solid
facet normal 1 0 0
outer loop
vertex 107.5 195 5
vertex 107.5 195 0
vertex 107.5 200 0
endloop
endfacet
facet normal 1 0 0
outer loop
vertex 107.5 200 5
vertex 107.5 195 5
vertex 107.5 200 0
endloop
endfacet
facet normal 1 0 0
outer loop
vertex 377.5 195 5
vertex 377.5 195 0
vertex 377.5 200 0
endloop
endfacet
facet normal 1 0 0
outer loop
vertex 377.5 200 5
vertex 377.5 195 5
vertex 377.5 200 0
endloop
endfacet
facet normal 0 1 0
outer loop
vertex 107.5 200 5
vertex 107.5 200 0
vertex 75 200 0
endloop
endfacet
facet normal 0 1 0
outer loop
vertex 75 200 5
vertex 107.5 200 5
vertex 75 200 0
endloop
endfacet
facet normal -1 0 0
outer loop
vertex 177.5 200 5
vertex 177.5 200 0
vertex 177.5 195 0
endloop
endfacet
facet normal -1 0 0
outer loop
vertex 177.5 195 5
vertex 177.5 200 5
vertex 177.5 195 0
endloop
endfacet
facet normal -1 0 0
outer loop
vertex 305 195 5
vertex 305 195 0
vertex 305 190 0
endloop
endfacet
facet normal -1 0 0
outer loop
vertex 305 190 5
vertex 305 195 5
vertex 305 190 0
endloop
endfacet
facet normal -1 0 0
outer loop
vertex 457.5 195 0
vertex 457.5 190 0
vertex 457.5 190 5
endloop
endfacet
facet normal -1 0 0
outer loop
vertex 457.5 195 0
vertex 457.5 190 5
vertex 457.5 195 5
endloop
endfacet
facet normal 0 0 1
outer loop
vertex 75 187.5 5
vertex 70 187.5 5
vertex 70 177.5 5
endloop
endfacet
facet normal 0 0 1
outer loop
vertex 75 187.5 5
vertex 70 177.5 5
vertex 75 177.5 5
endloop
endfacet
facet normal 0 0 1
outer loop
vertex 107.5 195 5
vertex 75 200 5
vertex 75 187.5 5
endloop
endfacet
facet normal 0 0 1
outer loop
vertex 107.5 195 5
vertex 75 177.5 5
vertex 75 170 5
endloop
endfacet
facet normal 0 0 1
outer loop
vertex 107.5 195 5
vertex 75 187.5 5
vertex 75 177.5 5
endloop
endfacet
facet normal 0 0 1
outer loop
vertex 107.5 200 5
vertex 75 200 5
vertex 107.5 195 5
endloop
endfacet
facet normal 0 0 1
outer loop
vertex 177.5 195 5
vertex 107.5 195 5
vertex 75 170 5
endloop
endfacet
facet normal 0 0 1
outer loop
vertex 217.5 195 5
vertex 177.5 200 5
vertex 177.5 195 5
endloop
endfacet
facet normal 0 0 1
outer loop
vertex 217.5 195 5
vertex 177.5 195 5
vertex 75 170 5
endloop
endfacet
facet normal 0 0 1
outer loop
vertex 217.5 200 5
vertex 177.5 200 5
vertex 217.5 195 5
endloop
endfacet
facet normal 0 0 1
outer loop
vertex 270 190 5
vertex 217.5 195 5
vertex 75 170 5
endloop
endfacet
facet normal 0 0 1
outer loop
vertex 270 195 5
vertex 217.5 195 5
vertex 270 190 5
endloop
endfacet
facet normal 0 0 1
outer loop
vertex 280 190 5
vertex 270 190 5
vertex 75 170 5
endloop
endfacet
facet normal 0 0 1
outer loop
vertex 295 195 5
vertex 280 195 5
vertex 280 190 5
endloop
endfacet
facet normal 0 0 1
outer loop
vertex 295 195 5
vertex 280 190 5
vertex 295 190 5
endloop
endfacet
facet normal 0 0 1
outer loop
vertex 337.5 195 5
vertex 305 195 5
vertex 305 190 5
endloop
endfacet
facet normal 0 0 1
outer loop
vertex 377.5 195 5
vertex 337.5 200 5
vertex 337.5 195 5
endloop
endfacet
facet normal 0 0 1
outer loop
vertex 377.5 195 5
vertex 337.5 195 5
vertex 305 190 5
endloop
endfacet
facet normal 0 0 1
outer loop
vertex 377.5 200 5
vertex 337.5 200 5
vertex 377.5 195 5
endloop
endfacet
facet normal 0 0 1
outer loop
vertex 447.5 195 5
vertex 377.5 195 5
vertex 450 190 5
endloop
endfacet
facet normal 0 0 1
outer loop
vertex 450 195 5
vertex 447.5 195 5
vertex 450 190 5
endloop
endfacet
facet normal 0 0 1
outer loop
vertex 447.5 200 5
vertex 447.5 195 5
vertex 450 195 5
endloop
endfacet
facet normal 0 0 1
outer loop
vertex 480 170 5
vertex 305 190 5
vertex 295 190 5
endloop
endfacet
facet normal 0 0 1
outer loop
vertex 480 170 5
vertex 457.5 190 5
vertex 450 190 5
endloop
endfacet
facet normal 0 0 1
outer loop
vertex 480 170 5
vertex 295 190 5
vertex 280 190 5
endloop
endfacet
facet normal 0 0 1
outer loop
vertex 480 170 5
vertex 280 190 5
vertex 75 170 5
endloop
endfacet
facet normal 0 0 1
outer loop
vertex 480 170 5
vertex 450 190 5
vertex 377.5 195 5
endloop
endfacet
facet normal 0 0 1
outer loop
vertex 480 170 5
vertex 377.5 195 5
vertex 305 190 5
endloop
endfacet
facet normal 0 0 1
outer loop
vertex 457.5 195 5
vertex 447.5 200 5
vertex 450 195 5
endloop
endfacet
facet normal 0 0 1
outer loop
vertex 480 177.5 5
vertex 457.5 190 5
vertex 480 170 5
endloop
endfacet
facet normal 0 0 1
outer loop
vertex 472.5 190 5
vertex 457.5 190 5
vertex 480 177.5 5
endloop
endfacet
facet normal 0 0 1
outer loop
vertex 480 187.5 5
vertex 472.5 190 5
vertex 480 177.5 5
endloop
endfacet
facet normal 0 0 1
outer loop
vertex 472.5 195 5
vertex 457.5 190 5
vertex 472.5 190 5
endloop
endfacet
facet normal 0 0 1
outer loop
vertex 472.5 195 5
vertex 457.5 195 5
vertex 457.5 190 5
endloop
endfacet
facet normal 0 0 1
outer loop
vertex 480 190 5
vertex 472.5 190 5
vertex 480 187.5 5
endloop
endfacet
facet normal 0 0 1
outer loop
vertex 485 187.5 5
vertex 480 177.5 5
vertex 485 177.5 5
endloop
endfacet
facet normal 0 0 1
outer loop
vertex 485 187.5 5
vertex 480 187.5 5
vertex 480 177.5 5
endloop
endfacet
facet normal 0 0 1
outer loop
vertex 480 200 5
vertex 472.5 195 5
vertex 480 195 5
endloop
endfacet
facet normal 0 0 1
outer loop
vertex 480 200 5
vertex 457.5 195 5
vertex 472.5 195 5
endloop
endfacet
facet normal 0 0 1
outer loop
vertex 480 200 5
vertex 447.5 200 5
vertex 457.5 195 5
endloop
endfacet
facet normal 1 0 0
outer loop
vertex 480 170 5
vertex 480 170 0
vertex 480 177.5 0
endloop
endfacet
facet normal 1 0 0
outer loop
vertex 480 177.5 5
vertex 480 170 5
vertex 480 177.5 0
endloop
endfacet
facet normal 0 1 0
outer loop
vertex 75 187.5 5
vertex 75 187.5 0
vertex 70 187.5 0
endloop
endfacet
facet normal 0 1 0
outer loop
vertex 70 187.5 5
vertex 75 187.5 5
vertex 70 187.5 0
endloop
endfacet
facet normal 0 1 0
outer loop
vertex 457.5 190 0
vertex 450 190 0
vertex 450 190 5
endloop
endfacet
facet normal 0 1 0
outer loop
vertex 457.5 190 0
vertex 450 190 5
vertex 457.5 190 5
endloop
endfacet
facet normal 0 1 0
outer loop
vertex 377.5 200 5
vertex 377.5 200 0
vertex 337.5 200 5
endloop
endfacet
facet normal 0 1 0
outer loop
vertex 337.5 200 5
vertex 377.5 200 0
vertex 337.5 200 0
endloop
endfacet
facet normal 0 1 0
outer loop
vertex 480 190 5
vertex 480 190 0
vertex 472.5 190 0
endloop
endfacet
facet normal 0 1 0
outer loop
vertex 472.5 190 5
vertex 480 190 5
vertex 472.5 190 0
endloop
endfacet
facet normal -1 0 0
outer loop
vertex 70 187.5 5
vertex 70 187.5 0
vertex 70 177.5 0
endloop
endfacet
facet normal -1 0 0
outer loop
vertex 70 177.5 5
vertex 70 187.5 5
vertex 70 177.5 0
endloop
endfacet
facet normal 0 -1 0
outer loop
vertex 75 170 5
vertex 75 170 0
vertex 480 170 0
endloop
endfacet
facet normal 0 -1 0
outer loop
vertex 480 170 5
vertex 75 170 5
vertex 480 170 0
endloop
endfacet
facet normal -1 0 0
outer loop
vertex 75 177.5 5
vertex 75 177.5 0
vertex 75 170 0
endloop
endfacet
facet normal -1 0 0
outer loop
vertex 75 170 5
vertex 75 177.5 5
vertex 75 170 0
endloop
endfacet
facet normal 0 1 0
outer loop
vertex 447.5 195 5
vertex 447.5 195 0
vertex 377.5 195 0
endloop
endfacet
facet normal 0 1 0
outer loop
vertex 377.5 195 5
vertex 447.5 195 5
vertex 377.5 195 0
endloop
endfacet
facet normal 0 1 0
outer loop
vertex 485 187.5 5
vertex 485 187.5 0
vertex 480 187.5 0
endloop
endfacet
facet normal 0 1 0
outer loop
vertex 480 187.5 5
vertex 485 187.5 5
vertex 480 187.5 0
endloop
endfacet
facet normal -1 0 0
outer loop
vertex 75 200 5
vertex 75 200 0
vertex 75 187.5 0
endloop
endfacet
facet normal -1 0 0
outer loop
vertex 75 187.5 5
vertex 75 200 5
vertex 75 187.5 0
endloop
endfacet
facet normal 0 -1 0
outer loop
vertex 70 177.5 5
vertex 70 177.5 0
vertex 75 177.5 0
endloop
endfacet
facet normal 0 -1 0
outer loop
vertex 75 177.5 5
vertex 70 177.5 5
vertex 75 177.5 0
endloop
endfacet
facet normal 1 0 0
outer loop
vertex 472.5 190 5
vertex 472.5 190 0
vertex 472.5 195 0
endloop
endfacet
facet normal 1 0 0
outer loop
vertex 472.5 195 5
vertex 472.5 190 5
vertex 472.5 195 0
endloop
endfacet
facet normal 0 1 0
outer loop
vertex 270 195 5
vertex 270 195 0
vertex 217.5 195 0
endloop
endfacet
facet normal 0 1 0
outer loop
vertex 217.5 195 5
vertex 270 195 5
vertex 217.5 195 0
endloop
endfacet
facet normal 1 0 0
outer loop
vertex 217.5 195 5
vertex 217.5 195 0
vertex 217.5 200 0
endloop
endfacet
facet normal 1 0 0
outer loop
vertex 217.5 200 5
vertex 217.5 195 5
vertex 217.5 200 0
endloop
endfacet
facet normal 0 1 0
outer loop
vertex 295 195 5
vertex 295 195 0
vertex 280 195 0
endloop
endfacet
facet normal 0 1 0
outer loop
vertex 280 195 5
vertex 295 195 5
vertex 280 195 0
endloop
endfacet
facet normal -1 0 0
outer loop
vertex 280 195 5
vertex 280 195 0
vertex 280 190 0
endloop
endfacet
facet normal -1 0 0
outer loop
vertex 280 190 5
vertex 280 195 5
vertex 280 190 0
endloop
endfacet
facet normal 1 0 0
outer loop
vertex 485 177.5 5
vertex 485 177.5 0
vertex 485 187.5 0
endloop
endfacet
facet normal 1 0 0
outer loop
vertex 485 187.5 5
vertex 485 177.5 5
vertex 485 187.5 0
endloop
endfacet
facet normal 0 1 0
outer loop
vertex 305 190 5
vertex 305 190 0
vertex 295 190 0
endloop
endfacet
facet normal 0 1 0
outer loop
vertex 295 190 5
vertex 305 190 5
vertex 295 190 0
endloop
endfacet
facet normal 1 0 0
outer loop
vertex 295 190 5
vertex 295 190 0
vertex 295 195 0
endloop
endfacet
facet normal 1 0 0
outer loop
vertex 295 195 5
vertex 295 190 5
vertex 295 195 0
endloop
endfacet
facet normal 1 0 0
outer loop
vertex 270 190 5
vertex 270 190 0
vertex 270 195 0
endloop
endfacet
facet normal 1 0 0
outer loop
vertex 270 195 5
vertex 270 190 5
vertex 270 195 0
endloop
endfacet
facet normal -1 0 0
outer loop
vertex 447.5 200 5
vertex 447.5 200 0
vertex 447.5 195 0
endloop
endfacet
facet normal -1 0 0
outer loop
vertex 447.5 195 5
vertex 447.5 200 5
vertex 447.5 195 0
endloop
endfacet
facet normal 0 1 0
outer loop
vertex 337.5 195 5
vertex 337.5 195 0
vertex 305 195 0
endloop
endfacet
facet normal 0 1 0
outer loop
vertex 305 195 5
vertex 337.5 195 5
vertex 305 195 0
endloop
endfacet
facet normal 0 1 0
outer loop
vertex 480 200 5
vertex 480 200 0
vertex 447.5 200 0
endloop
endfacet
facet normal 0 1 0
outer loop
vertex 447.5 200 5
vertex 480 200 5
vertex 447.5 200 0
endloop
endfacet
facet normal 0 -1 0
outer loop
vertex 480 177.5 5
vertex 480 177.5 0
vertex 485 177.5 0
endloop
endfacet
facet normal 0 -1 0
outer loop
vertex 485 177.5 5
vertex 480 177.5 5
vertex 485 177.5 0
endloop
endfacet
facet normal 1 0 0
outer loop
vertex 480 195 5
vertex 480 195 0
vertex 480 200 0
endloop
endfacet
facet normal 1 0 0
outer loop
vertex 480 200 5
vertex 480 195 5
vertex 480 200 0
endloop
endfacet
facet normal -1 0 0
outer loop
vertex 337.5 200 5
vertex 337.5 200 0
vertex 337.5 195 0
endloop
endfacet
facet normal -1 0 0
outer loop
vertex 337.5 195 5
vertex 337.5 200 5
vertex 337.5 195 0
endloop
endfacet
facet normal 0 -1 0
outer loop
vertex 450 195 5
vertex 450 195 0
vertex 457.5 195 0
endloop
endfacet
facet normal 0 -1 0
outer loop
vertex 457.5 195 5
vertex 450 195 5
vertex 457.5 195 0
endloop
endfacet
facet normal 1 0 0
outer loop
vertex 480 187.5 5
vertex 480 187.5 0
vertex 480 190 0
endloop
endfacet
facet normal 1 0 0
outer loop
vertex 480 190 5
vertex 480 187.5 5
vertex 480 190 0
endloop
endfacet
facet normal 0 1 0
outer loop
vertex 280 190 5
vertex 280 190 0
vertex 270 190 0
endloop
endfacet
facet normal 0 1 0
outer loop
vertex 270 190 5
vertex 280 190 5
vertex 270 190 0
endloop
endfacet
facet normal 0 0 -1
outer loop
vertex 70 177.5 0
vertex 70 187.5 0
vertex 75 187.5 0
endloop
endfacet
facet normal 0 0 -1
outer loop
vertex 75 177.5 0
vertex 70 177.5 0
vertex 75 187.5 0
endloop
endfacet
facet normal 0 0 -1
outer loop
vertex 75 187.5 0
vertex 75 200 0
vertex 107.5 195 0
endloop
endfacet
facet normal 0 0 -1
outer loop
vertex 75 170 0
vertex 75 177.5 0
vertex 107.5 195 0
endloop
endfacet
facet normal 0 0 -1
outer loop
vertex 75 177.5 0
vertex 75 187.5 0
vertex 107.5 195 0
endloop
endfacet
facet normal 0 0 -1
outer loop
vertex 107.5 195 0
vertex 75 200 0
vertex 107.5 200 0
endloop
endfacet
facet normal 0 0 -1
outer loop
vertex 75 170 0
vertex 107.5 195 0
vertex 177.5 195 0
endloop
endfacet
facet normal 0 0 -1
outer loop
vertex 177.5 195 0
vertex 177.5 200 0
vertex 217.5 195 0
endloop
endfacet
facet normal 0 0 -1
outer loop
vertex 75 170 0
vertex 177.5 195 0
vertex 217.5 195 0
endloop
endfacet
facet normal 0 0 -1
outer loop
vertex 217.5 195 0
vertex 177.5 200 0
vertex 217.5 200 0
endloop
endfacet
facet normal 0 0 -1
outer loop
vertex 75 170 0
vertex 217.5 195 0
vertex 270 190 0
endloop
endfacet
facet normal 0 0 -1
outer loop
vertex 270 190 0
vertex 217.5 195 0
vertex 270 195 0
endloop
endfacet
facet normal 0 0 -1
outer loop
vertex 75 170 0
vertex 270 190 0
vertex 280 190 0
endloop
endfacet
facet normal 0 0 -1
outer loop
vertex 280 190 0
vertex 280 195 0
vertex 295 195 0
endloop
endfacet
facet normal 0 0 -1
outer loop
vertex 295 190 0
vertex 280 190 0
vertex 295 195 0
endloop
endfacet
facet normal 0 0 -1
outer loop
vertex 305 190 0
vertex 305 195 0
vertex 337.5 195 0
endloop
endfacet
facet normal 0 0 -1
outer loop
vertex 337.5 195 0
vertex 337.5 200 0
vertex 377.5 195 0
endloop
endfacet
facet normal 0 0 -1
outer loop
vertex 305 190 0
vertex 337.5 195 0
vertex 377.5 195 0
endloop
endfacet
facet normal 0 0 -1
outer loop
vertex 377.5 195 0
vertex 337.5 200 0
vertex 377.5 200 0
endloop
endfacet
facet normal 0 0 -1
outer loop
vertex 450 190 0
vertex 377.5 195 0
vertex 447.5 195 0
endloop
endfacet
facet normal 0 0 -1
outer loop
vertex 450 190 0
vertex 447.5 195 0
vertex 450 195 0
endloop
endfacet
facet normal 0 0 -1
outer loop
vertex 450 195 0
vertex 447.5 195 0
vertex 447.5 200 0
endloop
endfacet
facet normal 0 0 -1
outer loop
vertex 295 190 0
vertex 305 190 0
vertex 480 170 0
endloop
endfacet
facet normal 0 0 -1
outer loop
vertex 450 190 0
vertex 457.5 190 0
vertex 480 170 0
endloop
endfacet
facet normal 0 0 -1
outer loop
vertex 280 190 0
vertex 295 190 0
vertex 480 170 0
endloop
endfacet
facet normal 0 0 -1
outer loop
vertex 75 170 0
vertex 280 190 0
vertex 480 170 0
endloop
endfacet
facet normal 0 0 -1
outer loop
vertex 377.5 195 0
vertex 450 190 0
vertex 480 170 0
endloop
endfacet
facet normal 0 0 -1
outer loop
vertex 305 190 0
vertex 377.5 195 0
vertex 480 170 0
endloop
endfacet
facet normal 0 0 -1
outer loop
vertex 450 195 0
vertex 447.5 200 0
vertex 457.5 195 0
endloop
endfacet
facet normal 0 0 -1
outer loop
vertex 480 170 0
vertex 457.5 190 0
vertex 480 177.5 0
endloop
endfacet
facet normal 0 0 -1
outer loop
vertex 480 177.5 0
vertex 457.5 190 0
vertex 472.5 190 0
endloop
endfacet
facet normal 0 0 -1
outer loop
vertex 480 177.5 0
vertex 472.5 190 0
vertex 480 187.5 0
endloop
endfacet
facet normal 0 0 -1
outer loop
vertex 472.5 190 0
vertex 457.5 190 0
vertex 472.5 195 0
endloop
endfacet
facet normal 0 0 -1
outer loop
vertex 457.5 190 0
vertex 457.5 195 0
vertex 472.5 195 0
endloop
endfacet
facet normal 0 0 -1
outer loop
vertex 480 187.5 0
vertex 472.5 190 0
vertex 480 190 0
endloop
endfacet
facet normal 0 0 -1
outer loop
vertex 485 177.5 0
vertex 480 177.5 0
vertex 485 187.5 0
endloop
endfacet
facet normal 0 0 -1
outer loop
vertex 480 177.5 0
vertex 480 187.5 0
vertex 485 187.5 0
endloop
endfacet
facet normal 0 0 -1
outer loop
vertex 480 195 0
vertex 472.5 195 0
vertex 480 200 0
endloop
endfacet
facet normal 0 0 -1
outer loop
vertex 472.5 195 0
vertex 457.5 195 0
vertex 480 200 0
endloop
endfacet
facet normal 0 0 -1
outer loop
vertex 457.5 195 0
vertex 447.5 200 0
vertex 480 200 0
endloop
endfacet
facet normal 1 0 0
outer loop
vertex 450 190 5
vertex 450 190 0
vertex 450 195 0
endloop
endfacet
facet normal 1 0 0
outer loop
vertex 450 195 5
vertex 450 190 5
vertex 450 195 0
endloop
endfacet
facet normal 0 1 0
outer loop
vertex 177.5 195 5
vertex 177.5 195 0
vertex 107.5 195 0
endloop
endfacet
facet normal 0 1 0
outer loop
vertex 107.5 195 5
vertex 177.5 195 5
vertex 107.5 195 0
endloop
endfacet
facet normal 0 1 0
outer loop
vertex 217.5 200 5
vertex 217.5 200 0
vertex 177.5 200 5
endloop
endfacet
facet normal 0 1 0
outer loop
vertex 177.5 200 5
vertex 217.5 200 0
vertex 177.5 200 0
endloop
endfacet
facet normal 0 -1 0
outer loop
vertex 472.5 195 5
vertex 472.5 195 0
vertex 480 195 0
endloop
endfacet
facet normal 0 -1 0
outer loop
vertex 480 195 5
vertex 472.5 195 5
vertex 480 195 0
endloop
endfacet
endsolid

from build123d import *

# Parameters (mm, degrees)
SKETCH1_W           = 7.5
SKETCH1_H           = 5
BOSS_EXTRUDE1_DEPTH = 5


with BuildPart() as part:
    # Sketch1 → Boss-Extrude1 (new body)
    with BuildSketch(Plane.XY):
        Polygon((480, 177.5), (485, 177.5), (485, 187.5), (480, 187.5), (480, 190), (472.5, 190), (472.5, 195), (480, 195), (480, 200), (447.5, 200), (447.5, 195), (377.5, 195), (377.5, 200), (337.5, 200), (337.5, 195), (305, 195), (305, 190), (295, 190), (295, 195), (280, 195), (280, 190), (270, 190), (270, 195), (217.5, 195), (217.5, 200), (177.5, 200), (177.5, 195), (107.5, 195), (107.5, 200), (75, 200), (75, 195), (75, 187.5), (70, 187.5), (70, 177.5), (75, 177.5), (75, 170), (480, 170), align=None)
        with Locations((453.75, 192.5)):
            Rectangle(SKETCH1_W, SKETCH1_H, mode=Mode.SUBTRACT)
    extrude(amount=BOSS_EXTRUDE1_DEPTH)


solid = part.part
